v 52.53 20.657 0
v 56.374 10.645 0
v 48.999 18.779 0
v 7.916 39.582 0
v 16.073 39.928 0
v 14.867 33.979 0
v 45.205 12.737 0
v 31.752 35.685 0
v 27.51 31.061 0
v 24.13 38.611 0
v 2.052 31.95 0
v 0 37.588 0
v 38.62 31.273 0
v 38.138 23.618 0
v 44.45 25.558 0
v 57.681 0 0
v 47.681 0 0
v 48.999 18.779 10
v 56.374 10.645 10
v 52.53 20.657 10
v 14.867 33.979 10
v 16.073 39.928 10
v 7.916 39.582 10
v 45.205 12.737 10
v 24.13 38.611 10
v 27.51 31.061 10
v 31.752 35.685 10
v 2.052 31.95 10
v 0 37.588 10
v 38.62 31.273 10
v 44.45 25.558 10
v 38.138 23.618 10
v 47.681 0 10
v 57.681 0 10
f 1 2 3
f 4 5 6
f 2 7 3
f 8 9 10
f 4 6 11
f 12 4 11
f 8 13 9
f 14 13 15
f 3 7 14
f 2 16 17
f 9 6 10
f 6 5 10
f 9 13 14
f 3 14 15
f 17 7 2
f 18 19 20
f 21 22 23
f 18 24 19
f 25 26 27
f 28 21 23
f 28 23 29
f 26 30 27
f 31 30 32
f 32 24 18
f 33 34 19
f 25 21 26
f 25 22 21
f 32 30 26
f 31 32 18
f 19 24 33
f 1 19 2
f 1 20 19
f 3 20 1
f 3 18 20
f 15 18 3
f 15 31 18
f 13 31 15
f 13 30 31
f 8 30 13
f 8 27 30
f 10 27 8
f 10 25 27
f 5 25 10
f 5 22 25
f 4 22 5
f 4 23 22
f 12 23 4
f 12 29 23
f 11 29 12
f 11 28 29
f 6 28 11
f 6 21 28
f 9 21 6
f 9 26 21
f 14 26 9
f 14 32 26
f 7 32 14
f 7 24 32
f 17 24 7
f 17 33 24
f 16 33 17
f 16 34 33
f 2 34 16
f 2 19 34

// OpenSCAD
$fn = 32;

// ----------------------------------------------------------------------
// Arc stop: segment, 10 mm thick
// ----------------------------------------------------------------------

// --- parameters (mm) ---
profile_height = 10;      // extrusion height
profile_points = 17;      // points of the closed outline

profile = [[57.681, 0], [56.374, 10.645], [52.53, 20.657], [48.999, 18.779], [44.45, 25.558], [38.62, 31.273], [31.752, 35.685], [24.13, 38.611], [16.073, 39.928], [7.916, 39.582], [0, 37.588], [2.052, 31.95], [14.867, 33.979], [27.51, 31.061], [38.138, 23.618], [45.205, 12.737], [47.681, 0]];  // single closed polygon, 17 points, counter clockwise

// --- the one profile operation ---
linear_extrude(height = profile_height) polygon(points = profile);
